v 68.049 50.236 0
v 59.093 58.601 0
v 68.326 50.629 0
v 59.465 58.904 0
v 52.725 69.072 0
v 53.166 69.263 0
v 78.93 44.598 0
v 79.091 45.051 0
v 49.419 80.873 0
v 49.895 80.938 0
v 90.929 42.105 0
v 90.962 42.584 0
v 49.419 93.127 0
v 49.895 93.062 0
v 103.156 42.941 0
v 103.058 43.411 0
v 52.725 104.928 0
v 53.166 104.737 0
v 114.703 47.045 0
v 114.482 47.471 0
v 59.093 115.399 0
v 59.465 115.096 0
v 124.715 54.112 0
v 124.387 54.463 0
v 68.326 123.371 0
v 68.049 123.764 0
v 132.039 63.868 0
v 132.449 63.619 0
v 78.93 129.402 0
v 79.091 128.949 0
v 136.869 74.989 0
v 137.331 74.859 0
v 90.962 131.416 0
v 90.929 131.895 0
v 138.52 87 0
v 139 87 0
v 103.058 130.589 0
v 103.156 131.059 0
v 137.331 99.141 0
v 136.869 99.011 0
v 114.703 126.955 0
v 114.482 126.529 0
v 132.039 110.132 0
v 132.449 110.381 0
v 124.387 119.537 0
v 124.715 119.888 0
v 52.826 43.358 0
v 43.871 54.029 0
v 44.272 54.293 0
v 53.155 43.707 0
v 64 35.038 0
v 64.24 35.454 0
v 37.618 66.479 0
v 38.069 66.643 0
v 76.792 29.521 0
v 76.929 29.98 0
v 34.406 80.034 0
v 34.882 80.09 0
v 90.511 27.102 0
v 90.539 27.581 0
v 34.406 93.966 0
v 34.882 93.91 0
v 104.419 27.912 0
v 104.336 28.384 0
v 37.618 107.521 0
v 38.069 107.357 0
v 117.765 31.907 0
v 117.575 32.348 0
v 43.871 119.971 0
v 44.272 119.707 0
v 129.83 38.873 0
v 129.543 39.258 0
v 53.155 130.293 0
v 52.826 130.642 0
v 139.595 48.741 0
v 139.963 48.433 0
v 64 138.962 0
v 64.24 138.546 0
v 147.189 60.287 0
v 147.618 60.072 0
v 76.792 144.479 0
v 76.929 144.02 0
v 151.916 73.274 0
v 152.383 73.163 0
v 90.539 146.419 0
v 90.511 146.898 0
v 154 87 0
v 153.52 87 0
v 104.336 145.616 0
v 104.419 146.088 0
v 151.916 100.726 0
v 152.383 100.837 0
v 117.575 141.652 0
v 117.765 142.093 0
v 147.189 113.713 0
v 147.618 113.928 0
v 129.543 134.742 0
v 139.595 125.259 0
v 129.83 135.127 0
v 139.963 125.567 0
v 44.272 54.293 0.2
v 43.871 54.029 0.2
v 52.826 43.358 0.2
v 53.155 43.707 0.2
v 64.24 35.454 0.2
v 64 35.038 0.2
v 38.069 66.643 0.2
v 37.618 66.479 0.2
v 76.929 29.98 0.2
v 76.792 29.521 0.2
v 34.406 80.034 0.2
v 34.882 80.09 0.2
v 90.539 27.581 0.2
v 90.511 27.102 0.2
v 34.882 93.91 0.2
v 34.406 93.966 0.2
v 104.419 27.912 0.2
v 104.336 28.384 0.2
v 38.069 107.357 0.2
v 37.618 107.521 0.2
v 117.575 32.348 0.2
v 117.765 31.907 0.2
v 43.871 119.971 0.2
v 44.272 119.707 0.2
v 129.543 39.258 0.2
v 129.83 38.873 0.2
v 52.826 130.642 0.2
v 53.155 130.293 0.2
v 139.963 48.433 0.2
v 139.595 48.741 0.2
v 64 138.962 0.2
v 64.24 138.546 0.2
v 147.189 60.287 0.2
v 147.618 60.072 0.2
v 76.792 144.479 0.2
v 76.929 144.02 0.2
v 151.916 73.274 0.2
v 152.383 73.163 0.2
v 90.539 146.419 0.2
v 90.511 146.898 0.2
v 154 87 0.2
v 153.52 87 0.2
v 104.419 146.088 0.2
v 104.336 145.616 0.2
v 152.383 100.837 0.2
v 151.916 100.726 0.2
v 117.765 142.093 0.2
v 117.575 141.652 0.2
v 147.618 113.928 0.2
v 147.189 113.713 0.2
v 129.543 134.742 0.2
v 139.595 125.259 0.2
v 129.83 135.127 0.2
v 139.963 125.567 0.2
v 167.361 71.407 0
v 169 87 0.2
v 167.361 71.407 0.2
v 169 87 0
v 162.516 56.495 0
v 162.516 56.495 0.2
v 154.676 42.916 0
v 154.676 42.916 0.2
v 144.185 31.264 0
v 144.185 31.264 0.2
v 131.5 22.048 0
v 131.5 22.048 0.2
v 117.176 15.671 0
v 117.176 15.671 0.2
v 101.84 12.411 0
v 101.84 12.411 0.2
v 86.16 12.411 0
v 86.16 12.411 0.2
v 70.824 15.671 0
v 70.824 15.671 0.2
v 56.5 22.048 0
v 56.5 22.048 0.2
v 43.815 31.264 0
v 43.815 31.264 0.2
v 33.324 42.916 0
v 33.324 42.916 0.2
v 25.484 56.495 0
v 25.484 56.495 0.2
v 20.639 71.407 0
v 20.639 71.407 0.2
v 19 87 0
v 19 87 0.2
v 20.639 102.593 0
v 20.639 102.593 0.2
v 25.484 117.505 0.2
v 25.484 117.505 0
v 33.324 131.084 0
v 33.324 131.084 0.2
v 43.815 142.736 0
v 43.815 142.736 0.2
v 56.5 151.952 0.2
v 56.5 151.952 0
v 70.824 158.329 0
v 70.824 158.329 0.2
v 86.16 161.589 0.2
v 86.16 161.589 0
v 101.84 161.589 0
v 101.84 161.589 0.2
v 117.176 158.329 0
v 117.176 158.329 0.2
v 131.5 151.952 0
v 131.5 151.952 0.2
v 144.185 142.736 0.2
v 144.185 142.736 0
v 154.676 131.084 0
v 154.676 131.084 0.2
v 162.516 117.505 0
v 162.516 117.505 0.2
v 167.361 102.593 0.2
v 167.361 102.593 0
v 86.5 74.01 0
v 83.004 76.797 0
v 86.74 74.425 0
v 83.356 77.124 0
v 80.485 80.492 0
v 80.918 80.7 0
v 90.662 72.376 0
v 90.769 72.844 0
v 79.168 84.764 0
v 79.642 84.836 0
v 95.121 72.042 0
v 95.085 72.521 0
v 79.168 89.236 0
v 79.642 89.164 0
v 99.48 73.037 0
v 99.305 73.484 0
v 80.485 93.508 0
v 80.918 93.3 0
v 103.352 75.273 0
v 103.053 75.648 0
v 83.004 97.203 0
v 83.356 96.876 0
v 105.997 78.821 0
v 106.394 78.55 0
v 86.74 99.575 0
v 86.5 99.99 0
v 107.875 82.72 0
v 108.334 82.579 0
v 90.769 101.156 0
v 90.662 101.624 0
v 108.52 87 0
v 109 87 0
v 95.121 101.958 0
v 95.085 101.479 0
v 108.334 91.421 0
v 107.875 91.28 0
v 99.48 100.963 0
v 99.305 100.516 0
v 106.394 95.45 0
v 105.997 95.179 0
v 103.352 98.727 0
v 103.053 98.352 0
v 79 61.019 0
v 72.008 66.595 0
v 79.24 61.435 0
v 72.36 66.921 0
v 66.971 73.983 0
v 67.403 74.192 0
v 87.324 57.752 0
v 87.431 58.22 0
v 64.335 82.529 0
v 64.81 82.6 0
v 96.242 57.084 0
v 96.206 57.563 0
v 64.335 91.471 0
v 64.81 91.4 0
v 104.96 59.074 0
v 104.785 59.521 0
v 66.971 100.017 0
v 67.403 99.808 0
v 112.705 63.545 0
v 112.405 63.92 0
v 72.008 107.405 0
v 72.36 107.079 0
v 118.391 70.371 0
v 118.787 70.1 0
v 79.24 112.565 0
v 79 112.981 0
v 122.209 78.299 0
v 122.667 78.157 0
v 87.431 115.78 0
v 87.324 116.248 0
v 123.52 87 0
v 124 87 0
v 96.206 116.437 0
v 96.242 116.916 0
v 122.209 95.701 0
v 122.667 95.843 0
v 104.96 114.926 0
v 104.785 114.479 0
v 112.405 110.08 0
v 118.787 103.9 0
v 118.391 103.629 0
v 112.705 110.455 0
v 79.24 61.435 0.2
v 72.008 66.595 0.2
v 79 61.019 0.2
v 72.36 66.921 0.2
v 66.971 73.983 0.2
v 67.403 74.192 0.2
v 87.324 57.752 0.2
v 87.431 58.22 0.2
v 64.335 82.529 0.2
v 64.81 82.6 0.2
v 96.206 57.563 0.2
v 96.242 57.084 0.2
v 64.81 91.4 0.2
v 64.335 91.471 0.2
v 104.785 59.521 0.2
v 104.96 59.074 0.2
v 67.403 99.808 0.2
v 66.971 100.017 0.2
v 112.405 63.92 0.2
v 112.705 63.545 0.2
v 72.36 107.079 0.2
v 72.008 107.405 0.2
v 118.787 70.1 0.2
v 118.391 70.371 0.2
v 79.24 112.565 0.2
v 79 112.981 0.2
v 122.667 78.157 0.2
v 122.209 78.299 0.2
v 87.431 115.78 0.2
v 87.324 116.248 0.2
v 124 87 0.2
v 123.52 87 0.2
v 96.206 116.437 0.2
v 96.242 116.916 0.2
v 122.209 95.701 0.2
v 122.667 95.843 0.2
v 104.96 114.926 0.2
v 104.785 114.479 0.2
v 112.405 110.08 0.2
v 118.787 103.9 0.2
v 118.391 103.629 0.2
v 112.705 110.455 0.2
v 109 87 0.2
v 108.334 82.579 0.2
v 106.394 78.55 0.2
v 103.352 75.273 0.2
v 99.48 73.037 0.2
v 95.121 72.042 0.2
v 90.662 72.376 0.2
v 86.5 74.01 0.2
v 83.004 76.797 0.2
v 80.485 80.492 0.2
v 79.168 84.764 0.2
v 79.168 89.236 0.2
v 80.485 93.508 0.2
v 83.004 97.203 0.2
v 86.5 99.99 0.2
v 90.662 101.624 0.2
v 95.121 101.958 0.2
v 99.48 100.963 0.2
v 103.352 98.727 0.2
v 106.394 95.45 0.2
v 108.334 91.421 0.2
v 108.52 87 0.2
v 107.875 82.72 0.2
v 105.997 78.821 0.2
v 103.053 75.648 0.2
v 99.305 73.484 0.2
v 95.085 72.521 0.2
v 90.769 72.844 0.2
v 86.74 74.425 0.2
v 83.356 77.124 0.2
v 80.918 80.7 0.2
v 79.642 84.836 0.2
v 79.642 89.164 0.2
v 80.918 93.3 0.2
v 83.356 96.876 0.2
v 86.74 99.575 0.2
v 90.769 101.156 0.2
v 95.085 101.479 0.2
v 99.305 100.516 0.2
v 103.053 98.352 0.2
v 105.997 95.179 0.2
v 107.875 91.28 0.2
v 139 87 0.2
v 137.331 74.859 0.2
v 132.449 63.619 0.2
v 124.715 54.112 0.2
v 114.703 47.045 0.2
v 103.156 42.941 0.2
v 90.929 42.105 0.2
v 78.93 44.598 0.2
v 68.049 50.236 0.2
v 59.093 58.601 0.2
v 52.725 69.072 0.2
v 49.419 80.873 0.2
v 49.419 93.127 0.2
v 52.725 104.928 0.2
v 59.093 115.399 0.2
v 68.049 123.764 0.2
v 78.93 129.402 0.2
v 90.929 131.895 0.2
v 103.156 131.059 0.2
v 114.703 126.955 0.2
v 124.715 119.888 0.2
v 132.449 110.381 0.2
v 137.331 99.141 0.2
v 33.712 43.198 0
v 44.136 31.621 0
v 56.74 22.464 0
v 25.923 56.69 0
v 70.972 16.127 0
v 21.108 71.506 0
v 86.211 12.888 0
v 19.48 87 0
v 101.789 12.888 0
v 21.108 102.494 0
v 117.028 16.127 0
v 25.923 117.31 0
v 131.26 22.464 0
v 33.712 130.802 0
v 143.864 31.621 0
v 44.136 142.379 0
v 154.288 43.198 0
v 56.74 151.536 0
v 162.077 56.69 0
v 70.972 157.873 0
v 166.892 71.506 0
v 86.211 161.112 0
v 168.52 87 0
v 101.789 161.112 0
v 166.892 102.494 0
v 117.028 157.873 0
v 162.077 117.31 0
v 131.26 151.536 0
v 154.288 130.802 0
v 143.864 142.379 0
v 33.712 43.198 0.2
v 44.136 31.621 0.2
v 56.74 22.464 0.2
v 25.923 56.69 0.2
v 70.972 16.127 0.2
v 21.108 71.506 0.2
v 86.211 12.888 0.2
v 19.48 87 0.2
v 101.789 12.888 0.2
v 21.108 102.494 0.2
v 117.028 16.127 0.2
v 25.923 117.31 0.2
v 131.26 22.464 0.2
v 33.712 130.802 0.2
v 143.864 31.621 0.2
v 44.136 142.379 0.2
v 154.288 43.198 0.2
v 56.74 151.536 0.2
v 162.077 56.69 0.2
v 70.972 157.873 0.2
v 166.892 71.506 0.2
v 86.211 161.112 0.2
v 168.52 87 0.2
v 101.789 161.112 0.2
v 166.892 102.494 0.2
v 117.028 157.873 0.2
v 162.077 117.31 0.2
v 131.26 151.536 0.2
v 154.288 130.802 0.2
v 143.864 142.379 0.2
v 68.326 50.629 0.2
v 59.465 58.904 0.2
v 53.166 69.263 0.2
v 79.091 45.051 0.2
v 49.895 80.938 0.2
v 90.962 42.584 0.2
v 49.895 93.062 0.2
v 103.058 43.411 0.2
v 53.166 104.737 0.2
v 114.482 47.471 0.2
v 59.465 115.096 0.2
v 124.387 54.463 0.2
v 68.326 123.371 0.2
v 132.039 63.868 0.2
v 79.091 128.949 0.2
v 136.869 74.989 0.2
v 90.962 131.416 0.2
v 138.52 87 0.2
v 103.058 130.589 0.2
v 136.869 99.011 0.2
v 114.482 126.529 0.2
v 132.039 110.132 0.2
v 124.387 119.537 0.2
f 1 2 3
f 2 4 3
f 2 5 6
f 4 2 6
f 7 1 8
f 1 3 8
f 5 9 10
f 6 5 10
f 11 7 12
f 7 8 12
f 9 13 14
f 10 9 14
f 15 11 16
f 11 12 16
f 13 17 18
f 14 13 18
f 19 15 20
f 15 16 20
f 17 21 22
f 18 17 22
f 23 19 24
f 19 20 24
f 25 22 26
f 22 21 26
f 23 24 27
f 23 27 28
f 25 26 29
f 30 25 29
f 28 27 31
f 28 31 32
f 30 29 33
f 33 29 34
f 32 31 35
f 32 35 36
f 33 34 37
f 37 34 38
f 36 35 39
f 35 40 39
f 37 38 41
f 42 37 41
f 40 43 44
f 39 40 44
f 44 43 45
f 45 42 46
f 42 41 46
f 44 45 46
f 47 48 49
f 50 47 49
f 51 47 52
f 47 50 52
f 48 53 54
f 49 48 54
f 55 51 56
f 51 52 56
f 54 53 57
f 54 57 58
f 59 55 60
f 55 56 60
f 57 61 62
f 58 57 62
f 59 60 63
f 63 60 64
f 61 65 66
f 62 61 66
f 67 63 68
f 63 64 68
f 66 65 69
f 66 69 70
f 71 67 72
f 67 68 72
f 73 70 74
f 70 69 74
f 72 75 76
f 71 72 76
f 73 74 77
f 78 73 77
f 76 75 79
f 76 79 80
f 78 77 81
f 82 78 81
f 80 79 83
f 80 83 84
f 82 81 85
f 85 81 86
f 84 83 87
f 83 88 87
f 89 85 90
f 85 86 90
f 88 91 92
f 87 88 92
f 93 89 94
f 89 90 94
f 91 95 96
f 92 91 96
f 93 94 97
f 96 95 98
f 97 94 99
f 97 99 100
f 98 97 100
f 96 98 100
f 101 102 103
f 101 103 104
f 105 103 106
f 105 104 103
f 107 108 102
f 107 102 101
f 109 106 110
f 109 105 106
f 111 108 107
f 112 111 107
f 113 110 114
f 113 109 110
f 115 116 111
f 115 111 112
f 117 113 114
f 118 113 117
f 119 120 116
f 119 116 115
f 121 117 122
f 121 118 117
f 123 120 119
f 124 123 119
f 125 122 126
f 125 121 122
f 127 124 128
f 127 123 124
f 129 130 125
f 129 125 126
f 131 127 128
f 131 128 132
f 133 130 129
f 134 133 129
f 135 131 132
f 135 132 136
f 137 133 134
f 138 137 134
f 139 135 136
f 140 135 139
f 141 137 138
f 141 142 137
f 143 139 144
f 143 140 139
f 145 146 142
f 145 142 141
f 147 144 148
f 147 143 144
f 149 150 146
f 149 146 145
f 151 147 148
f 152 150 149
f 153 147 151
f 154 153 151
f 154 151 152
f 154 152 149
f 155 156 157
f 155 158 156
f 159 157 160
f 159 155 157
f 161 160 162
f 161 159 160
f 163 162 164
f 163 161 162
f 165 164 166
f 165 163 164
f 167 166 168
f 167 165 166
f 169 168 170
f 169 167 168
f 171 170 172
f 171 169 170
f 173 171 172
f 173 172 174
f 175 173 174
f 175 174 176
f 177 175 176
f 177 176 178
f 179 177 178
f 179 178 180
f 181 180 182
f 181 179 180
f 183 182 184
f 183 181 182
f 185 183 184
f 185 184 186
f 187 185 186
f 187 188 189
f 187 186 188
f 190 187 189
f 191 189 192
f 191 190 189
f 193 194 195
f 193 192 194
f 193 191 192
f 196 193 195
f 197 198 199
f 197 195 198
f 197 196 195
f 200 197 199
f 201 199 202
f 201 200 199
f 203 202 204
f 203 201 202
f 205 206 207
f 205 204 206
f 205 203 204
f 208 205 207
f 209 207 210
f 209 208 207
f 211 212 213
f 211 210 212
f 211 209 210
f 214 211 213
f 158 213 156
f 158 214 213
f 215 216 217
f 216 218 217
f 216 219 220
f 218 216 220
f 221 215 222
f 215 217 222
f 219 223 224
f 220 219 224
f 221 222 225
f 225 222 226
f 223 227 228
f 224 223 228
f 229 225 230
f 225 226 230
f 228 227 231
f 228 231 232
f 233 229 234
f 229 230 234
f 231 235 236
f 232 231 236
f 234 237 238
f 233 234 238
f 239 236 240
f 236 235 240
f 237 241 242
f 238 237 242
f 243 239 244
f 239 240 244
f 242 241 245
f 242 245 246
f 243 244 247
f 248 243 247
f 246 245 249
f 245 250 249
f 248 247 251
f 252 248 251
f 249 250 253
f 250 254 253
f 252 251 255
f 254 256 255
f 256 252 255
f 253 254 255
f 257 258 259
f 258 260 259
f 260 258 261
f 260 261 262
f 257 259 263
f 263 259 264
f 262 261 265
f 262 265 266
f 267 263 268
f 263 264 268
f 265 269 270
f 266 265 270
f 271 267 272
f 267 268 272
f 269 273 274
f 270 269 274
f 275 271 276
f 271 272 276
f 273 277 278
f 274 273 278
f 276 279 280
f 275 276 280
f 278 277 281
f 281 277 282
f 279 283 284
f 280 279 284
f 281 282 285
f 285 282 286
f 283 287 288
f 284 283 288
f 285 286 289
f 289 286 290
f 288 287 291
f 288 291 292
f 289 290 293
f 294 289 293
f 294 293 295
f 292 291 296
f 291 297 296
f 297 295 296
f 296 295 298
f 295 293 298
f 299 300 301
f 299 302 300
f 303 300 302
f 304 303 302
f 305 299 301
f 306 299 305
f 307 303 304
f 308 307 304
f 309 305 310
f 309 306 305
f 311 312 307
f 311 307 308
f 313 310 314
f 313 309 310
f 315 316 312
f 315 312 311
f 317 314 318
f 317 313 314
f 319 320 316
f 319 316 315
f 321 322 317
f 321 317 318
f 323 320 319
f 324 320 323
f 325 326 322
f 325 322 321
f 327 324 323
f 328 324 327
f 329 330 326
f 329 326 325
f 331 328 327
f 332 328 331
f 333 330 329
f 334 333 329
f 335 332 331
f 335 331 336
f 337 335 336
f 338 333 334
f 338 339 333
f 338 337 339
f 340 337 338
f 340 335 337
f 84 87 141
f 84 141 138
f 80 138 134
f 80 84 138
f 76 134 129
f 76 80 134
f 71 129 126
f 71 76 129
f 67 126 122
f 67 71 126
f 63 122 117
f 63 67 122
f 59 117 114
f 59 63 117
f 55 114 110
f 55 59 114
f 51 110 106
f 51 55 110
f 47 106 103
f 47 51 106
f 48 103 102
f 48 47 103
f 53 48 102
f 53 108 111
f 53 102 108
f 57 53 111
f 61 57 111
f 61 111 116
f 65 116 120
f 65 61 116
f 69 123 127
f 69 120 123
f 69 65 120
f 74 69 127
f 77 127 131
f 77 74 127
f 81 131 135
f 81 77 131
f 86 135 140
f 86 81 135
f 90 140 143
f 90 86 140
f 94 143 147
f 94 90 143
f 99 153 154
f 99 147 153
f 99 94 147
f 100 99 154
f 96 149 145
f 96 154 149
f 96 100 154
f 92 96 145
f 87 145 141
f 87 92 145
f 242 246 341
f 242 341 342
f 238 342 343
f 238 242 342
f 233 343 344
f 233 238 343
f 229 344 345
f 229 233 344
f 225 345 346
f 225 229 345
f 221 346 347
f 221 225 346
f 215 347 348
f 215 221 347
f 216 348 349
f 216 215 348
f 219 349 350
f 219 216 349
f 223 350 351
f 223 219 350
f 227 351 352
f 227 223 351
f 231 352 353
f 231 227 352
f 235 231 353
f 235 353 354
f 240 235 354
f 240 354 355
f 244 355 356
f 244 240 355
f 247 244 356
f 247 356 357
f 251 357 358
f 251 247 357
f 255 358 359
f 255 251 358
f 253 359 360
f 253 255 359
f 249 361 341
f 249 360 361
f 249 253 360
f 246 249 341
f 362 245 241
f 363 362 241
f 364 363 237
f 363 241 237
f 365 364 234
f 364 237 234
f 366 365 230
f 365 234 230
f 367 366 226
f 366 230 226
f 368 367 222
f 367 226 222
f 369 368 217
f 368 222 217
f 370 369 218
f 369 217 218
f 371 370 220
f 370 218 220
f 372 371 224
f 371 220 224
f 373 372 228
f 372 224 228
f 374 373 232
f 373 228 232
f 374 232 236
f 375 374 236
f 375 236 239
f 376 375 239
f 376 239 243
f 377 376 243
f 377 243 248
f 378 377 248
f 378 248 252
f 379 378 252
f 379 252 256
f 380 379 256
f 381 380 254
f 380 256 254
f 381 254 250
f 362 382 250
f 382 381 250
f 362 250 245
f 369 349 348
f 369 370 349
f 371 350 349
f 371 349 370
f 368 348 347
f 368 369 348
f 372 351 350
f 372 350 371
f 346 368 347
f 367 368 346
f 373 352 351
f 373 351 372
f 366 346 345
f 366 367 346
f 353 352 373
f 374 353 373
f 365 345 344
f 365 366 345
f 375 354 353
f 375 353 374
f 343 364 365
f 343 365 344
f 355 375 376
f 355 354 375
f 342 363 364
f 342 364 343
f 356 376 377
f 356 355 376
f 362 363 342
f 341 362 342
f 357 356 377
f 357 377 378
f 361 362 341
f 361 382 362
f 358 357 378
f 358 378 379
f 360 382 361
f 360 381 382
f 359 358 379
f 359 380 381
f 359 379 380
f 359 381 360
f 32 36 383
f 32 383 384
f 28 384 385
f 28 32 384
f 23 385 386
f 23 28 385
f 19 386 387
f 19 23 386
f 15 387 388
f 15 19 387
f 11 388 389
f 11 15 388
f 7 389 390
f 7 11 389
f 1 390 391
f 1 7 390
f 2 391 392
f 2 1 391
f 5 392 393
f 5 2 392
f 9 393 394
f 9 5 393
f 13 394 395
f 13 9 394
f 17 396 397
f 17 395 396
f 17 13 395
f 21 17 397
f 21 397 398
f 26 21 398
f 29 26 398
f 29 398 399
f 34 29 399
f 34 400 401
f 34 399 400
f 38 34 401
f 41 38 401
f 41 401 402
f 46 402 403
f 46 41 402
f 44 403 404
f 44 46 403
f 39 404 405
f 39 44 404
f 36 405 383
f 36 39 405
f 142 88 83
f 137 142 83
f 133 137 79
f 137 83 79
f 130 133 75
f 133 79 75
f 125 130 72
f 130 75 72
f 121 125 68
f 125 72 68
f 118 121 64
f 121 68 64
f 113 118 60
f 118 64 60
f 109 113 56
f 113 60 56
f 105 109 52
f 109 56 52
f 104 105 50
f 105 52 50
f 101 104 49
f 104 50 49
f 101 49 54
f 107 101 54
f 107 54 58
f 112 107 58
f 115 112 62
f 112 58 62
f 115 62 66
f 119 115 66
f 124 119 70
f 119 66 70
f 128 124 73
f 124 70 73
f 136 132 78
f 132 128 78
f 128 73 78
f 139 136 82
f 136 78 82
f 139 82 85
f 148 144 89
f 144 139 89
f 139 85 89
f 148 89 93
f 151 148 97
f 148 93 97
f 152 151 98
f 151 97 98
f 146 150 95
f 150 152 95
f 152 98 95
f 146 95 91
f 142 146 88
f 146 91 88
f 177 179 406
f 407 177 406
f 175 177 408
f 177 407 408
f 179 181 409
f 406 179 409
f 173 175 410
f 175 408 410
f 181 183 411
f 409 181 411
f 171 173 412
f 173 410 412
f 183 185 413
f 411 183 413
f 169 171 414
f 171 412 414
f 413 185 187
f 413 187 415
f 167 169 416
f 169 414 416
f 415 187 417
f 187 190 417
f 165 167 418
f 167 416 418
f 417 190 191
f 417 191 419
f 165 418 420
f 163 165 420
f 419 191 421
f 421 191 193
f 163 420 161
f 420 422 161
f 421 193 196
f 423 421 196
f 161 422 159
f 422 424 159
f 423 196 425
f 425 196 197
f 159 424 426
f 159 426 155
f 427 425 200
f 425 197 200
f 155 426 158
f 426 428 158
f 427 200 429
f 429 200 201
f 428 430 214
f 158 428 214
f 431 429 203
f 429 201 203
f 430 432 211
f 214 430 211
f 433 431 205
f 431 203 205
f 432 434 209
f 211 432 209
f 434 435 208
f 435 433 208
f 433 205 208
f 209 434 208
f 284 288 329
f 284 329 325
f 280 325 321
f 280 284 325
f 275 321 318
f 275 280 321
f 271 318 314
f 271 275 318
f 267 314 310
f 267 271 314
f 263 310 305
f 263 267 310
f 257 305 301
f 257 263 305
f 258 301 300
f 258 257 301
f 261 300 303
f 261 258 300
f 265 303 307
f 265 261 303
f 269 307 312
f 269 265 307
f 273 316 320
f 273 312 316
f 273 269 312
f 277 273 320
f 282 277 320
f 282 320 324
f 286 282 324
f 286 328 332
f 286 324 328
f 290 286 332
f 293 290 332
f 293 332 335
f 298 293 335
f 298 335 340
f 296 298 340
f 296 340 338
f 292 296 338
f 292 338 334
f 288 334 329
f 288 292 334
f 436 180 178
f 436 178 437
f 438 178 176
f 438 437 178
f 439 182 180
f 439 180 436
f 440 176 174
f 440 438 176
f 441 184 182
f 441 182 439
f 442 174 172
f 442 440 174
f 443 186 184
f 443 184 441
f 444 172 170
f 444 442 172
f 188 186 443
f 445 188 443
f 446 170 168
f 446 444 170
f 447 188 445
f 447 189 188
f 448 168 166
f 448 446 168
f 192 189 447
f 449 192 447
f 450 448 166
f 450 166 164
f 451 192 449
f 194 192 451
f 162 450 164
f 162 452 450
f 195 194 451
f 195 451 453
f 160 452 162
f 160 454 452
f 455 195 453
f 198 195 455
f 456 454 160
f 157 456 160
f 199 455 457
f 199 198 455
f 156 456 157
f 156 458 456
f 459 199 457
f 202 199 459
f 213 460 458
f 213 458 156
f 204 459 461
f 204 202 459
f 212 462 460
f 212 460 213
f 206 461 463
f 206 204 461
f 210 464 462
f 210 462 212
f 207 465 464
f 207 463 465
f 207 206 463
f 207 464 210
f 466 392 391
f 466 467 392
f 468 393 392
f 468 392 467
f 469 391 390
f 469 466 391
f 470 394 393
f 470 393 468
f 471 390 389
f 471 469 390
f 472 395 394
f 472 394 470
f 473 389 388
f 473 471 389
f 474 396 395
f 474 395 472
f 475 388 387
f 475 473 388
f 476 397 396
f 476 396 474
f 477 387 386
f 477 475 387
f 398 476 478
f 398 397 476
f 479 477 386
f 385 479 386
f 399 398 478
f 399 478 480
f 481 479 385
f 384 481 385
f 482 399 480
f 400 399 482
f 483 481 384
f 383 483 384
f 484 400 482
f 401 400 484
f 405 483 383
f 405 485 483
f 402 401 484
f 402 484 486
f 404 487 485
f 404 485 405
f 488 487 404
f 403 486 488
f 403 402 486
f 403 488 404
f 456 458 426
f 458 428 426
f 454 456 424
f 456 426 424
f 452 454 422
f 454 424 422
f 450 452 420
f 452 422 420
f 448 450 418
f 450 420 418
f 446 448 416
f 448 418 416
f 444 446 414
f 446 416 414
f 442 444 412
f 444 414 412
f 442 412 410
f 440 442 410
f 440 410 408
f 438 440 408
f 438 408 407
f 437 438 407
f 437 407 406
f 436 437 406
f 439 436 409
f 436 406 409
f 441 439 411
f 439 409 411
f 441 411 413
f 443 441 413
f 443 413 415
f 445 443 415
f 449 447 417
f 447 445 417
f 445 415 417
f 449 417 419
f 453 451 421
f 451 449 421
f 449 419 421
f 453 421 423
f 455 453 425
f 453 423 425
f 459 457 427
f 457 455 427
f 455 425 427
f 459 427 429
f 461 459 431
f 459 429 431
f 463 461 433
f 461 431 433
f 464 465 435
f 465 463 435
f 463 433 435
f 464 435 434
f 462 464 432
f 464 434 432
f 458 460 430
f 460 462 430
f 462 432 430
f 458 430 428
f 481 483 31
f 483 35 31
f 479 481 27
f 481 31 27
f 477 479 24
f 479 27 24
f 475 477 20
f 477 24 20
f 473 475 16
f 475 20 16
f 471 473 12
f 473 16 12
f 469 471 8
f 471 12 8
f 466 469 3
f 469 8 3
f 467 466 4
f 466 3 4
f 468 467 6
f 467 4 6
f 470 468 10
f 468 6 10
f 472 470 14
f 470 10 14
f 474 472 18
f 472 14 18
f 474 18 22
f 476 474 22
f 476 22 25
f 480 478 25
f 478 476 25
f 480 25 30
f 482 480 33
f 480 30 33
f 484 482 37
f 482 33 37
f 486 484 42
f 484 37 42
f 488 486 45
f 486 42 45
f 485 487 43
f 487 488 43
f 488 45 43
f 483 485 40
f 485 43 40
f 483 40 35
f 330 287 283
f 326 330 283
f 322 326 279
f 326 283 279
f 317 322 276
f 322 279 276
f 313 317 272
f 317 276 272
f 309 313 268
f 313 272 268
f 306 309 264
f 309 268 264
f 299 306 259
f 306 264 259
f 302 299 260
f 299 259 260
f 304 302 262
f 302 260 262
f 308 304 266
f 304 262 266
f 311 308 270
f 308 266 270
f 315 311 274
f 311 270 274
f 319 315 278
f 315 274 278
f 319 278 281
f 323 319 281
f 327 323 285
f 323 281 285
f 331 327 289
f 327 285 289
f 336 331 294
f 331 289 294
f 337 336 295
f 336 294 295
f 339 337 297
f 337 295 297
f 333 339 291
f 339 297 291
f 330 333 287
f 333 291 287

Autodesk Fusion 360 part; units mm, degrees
sketch "Sketch1" plane through (0, 0, 0) normal (0, 0, 1) x (1, 0, 0)
  circle A0 centre (94, 87) radius 75
  circle A1 centre (94, 87) radius 45
  circle A2 centre (94, 87) radius 15
  circle A3 centre (94, 87) radius 60
  circle A4 centre (94, 87) radius 30
  circle A5 centre (94, 87) radius 74.52
  circle A6 centre (94, 87) radius 59.52
  circle A7 centre (94, 87) radius 44.52
  circle A8 centre (94, 87) radius 29.52
  circle A9 centre (94, 87) radius 14.52
  dimension "d1" = 150
  dimension "d2" = -30
  dimension "d3" = -60
  dimension "d4" = -15
  dimension "d5" = -45
  dimension "d6" = -0.48
  dimension "d7" = -15.48
  dimension "d8" = -30.48
  dimension "d9" = -45.48
  dimension "d10" = -60.48
extrude "Extrude1" add sketch "Sketch1" along normal blind 0.2 makes body 1 at (81.8799, 130.055, 0) makes body 2 at (153.6166, 89.9808, 0) makes body 3 at (103.4736, 58.7822, 0) makes body 4 at (168.5608, 90.7261, 0) makes body 5 at (82.6556, 96.5095, 0)
